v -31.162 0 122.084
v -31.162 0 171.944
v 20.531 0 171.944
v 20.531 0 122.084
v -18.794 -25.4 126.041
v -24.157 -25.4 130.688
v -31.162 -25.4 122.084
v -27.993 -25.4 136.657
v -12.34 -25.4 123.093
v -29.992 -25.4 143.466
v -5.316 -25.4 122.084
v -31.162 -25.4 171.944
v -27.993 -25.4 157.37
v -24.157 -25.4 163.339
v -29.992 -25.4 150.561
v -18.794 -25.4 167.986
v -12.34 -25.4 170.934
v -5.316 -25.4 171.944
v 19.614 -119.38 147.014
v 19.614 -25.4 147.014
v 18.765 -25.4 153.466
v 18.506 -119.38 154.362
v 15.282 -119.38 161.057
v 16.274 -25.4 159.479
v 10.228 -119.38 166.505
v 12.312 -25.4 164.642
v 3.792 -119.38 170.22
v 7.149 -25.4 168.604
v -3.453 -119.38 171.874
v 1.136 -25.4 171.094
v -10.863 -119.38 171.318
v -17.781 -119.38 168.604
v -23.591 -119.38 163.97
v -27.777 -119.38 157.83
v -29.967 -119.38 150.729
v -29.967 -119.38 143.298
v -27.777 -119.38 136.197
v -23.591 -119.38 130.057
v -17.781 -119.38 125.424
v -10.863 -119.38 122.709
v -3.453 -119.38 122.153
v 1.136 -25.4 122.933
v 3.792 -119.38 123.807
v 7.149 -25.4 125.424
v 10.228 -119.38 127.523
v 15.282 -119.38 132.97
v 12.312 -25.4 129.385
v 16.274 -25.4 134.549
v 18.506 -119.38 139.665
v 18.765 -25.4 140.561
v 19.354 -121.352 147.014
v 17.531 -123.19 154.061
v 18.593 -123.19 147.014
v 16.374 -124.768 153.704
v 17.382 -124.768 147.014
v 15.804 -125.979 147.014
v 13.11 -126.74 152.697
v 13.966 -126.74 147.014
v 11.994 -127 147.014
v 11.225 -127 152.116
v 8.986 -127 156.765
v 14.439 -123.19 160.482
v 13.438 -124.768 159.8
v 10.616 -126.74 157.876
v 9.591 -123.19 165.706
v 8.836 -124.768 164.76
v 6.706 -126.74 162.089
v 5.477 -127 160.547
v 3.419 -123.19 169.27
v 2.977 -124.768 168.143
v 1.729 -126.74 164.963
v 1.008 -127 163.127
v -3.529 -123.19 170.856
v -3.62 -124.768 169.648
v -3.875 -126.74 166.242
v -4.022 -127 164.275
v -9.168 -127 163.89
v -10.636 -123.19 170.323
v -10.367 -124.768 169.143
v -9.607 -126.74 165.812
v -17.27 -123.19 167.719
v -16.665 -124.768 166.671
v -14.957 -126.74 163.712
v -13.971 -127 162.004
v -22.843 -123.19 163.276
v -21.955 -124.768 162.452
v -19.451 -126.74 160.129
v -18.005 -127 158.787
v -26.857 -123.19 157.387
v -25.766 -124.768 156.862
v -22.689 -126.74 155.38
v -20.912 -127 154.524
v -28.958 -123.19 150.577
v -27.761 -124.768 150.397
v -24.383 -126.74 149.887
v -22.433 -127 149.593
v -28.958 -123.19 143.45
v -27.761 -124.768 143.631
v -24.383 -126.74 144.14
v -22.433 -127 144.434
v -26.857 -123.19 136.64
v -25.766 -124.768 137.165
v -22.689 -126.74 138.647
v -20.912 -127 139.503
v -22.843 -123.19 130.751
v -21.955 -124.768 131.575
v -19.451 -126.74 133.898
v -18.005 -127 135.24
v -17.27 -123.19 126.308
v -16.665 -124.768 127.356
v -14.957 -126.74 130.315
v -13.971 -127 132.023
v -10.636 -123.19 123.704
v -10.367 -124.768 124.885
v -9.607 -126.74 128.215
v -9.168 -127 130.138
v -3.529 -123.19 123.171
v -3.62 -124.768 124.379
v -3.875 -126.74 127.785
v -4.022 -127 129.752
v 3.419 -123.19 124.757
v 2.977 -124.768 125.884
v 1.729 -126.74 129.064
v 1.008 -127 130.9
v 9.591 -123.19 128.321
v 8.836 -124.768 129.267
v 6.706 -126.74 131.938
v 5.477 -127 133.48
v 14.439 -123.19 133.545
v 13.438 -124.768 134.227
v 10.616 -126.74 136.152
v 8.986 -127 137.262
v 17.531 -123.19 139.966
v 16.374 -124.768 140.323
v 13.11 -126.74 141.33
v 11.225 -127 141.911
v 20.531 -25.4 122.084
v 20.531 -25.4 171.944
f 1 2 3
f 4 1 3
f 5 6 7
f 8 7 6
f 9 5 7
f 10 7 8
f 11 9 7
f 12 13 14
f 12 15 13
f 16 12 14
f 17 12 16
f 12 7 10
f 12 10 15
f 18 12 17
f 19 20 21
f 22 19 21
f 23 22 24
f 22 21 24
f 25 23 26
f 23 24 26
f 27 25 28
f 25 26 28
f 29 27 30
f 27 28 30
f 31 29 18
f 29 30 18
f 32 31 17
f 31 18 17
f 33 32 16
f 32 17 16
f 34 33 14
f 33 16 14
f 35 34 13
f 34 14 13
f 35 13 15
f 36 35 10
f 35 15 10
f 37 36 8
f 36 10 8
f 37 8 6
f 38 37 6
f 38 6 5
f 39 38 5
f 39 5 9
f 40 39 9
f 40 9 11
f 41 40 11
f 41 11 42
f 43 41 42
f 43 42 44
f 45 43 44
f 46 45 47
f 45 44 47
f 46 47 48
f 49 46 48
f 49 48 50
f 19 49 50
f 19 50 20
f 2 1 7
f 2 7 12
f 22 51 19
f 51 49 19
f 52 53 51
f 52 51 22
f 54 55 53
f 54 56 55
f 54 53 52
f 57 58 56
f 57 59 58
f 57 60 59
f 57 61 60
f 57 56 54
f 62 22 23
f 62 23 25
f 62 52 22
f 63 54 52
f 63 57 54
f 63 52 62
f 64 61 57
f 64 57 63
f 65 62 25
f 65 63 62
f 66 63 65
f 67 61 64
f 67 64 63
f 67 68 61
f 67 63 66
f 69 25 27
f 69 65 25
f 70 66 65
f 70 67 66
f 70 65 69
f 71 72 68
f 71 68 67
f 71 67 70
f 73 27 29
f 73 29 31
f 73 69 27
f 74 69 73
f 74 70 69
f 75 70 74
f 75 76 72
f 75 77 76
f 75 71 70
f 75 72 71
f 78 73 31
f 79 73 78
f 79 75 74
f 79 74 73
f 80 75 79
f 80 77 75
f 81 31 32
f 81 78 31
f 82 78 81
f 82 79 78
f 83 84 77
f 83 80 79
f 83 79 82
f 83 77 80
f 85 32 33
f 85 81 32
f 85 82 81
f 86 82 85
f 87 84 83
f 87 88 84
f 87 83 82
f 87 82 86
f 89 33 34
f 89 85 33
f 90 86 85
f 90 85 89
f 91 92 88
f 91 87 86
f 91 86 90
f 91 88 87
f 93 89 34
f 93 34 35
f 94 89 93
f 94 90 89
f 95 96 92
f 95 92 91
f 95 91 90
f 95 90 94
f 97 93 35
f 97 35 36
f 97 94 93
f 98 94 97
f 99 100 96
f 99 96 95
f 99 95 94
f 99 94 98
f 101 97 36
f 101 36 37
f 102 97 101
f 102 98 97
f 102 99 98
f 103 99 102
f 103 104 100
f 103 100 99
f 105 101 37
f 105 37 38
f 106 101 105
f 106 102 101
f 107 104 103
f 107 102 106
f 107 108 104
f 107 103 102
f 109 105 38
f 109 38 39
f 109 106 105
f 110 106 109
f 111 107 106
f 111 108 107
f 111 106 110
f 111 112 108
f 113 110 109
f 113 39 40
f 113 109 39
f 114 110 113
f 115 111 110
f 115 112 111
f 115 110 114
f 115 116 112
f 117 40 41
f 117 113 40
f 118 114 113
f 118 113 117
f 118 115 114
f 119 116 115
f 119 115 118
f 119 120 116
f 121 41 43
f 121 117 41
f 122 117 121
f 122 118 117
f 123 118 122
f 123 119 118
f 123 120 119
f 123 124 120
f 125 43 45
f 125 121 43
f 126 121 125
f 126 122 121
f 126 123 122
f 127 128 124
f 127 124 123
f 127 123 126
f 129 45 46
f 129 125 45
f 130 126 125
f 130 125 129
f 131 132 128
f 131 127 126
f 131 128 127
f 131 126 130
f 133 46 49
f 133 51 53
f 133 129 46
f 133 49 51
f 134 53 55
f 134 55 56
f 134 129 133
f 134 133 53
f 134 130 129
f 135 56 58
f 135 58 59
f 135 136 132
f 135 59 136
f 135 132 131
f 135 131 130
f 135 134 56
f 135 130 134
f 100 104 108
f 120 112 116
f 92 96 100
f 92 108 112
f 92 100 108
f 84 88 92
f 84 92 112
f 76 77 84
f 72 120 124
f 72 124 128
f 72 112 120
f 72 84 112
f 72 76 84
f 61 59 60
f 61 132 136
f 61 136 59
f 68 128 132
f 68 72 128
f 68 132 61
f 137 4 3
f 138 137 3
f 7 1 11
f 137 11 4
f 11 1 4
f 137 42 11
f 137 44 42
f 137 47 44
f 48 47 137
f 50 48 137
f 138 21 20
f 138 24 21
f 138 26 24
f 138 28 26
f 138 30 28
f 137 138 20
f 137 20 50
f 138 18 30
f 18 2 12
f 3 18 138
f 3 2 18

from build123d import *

# Parameters (mm, degrees)
F0_W     = 51.6930520535
F0_H     = 49.859970808
F1_DEPTH = 25.4
F2_R     = 24.929985404
F3_DEPTH = 76.2
F4_R     = 24.929985404
F5_DEPTH = 25.4
F6_R     = 7.62


with BuildPart() as f1:
    # F0 (on Front) → F1 (new body)
    with BuildSketch(Plane.XZ):
        with Locations((-5.3159445524, 147.0135599375)):
            Rectangle(F0_W, F0_H)
    extrude(amount=F1_DEPTH)

    # F2 (on face) → F3 (join)
    with BuildSketch(Plane.XZ.offset(25.4)):
        with Locations((-5.3159445524, 147.0135599375)):
            Circle(F2_R)
    extrude(amount=F3_DEPTH)

    # F4 (on face) → F5 (join)
    with BuildSketch(Plane.XZ.offset(101.6)):
        with Locations((-5.3159445524, 147.0135599375)):
            Circle(F4_R)
    extrude(amount=F5_DEPTH)

    # F6
    f6_edges = [f1.edges().sort_by_distance(p)[0] for p in [
        (-30.24593, -127, 147.01356),
    ]]
    fillet(f6_edges, radius=F6_R)


solid = f1.part
